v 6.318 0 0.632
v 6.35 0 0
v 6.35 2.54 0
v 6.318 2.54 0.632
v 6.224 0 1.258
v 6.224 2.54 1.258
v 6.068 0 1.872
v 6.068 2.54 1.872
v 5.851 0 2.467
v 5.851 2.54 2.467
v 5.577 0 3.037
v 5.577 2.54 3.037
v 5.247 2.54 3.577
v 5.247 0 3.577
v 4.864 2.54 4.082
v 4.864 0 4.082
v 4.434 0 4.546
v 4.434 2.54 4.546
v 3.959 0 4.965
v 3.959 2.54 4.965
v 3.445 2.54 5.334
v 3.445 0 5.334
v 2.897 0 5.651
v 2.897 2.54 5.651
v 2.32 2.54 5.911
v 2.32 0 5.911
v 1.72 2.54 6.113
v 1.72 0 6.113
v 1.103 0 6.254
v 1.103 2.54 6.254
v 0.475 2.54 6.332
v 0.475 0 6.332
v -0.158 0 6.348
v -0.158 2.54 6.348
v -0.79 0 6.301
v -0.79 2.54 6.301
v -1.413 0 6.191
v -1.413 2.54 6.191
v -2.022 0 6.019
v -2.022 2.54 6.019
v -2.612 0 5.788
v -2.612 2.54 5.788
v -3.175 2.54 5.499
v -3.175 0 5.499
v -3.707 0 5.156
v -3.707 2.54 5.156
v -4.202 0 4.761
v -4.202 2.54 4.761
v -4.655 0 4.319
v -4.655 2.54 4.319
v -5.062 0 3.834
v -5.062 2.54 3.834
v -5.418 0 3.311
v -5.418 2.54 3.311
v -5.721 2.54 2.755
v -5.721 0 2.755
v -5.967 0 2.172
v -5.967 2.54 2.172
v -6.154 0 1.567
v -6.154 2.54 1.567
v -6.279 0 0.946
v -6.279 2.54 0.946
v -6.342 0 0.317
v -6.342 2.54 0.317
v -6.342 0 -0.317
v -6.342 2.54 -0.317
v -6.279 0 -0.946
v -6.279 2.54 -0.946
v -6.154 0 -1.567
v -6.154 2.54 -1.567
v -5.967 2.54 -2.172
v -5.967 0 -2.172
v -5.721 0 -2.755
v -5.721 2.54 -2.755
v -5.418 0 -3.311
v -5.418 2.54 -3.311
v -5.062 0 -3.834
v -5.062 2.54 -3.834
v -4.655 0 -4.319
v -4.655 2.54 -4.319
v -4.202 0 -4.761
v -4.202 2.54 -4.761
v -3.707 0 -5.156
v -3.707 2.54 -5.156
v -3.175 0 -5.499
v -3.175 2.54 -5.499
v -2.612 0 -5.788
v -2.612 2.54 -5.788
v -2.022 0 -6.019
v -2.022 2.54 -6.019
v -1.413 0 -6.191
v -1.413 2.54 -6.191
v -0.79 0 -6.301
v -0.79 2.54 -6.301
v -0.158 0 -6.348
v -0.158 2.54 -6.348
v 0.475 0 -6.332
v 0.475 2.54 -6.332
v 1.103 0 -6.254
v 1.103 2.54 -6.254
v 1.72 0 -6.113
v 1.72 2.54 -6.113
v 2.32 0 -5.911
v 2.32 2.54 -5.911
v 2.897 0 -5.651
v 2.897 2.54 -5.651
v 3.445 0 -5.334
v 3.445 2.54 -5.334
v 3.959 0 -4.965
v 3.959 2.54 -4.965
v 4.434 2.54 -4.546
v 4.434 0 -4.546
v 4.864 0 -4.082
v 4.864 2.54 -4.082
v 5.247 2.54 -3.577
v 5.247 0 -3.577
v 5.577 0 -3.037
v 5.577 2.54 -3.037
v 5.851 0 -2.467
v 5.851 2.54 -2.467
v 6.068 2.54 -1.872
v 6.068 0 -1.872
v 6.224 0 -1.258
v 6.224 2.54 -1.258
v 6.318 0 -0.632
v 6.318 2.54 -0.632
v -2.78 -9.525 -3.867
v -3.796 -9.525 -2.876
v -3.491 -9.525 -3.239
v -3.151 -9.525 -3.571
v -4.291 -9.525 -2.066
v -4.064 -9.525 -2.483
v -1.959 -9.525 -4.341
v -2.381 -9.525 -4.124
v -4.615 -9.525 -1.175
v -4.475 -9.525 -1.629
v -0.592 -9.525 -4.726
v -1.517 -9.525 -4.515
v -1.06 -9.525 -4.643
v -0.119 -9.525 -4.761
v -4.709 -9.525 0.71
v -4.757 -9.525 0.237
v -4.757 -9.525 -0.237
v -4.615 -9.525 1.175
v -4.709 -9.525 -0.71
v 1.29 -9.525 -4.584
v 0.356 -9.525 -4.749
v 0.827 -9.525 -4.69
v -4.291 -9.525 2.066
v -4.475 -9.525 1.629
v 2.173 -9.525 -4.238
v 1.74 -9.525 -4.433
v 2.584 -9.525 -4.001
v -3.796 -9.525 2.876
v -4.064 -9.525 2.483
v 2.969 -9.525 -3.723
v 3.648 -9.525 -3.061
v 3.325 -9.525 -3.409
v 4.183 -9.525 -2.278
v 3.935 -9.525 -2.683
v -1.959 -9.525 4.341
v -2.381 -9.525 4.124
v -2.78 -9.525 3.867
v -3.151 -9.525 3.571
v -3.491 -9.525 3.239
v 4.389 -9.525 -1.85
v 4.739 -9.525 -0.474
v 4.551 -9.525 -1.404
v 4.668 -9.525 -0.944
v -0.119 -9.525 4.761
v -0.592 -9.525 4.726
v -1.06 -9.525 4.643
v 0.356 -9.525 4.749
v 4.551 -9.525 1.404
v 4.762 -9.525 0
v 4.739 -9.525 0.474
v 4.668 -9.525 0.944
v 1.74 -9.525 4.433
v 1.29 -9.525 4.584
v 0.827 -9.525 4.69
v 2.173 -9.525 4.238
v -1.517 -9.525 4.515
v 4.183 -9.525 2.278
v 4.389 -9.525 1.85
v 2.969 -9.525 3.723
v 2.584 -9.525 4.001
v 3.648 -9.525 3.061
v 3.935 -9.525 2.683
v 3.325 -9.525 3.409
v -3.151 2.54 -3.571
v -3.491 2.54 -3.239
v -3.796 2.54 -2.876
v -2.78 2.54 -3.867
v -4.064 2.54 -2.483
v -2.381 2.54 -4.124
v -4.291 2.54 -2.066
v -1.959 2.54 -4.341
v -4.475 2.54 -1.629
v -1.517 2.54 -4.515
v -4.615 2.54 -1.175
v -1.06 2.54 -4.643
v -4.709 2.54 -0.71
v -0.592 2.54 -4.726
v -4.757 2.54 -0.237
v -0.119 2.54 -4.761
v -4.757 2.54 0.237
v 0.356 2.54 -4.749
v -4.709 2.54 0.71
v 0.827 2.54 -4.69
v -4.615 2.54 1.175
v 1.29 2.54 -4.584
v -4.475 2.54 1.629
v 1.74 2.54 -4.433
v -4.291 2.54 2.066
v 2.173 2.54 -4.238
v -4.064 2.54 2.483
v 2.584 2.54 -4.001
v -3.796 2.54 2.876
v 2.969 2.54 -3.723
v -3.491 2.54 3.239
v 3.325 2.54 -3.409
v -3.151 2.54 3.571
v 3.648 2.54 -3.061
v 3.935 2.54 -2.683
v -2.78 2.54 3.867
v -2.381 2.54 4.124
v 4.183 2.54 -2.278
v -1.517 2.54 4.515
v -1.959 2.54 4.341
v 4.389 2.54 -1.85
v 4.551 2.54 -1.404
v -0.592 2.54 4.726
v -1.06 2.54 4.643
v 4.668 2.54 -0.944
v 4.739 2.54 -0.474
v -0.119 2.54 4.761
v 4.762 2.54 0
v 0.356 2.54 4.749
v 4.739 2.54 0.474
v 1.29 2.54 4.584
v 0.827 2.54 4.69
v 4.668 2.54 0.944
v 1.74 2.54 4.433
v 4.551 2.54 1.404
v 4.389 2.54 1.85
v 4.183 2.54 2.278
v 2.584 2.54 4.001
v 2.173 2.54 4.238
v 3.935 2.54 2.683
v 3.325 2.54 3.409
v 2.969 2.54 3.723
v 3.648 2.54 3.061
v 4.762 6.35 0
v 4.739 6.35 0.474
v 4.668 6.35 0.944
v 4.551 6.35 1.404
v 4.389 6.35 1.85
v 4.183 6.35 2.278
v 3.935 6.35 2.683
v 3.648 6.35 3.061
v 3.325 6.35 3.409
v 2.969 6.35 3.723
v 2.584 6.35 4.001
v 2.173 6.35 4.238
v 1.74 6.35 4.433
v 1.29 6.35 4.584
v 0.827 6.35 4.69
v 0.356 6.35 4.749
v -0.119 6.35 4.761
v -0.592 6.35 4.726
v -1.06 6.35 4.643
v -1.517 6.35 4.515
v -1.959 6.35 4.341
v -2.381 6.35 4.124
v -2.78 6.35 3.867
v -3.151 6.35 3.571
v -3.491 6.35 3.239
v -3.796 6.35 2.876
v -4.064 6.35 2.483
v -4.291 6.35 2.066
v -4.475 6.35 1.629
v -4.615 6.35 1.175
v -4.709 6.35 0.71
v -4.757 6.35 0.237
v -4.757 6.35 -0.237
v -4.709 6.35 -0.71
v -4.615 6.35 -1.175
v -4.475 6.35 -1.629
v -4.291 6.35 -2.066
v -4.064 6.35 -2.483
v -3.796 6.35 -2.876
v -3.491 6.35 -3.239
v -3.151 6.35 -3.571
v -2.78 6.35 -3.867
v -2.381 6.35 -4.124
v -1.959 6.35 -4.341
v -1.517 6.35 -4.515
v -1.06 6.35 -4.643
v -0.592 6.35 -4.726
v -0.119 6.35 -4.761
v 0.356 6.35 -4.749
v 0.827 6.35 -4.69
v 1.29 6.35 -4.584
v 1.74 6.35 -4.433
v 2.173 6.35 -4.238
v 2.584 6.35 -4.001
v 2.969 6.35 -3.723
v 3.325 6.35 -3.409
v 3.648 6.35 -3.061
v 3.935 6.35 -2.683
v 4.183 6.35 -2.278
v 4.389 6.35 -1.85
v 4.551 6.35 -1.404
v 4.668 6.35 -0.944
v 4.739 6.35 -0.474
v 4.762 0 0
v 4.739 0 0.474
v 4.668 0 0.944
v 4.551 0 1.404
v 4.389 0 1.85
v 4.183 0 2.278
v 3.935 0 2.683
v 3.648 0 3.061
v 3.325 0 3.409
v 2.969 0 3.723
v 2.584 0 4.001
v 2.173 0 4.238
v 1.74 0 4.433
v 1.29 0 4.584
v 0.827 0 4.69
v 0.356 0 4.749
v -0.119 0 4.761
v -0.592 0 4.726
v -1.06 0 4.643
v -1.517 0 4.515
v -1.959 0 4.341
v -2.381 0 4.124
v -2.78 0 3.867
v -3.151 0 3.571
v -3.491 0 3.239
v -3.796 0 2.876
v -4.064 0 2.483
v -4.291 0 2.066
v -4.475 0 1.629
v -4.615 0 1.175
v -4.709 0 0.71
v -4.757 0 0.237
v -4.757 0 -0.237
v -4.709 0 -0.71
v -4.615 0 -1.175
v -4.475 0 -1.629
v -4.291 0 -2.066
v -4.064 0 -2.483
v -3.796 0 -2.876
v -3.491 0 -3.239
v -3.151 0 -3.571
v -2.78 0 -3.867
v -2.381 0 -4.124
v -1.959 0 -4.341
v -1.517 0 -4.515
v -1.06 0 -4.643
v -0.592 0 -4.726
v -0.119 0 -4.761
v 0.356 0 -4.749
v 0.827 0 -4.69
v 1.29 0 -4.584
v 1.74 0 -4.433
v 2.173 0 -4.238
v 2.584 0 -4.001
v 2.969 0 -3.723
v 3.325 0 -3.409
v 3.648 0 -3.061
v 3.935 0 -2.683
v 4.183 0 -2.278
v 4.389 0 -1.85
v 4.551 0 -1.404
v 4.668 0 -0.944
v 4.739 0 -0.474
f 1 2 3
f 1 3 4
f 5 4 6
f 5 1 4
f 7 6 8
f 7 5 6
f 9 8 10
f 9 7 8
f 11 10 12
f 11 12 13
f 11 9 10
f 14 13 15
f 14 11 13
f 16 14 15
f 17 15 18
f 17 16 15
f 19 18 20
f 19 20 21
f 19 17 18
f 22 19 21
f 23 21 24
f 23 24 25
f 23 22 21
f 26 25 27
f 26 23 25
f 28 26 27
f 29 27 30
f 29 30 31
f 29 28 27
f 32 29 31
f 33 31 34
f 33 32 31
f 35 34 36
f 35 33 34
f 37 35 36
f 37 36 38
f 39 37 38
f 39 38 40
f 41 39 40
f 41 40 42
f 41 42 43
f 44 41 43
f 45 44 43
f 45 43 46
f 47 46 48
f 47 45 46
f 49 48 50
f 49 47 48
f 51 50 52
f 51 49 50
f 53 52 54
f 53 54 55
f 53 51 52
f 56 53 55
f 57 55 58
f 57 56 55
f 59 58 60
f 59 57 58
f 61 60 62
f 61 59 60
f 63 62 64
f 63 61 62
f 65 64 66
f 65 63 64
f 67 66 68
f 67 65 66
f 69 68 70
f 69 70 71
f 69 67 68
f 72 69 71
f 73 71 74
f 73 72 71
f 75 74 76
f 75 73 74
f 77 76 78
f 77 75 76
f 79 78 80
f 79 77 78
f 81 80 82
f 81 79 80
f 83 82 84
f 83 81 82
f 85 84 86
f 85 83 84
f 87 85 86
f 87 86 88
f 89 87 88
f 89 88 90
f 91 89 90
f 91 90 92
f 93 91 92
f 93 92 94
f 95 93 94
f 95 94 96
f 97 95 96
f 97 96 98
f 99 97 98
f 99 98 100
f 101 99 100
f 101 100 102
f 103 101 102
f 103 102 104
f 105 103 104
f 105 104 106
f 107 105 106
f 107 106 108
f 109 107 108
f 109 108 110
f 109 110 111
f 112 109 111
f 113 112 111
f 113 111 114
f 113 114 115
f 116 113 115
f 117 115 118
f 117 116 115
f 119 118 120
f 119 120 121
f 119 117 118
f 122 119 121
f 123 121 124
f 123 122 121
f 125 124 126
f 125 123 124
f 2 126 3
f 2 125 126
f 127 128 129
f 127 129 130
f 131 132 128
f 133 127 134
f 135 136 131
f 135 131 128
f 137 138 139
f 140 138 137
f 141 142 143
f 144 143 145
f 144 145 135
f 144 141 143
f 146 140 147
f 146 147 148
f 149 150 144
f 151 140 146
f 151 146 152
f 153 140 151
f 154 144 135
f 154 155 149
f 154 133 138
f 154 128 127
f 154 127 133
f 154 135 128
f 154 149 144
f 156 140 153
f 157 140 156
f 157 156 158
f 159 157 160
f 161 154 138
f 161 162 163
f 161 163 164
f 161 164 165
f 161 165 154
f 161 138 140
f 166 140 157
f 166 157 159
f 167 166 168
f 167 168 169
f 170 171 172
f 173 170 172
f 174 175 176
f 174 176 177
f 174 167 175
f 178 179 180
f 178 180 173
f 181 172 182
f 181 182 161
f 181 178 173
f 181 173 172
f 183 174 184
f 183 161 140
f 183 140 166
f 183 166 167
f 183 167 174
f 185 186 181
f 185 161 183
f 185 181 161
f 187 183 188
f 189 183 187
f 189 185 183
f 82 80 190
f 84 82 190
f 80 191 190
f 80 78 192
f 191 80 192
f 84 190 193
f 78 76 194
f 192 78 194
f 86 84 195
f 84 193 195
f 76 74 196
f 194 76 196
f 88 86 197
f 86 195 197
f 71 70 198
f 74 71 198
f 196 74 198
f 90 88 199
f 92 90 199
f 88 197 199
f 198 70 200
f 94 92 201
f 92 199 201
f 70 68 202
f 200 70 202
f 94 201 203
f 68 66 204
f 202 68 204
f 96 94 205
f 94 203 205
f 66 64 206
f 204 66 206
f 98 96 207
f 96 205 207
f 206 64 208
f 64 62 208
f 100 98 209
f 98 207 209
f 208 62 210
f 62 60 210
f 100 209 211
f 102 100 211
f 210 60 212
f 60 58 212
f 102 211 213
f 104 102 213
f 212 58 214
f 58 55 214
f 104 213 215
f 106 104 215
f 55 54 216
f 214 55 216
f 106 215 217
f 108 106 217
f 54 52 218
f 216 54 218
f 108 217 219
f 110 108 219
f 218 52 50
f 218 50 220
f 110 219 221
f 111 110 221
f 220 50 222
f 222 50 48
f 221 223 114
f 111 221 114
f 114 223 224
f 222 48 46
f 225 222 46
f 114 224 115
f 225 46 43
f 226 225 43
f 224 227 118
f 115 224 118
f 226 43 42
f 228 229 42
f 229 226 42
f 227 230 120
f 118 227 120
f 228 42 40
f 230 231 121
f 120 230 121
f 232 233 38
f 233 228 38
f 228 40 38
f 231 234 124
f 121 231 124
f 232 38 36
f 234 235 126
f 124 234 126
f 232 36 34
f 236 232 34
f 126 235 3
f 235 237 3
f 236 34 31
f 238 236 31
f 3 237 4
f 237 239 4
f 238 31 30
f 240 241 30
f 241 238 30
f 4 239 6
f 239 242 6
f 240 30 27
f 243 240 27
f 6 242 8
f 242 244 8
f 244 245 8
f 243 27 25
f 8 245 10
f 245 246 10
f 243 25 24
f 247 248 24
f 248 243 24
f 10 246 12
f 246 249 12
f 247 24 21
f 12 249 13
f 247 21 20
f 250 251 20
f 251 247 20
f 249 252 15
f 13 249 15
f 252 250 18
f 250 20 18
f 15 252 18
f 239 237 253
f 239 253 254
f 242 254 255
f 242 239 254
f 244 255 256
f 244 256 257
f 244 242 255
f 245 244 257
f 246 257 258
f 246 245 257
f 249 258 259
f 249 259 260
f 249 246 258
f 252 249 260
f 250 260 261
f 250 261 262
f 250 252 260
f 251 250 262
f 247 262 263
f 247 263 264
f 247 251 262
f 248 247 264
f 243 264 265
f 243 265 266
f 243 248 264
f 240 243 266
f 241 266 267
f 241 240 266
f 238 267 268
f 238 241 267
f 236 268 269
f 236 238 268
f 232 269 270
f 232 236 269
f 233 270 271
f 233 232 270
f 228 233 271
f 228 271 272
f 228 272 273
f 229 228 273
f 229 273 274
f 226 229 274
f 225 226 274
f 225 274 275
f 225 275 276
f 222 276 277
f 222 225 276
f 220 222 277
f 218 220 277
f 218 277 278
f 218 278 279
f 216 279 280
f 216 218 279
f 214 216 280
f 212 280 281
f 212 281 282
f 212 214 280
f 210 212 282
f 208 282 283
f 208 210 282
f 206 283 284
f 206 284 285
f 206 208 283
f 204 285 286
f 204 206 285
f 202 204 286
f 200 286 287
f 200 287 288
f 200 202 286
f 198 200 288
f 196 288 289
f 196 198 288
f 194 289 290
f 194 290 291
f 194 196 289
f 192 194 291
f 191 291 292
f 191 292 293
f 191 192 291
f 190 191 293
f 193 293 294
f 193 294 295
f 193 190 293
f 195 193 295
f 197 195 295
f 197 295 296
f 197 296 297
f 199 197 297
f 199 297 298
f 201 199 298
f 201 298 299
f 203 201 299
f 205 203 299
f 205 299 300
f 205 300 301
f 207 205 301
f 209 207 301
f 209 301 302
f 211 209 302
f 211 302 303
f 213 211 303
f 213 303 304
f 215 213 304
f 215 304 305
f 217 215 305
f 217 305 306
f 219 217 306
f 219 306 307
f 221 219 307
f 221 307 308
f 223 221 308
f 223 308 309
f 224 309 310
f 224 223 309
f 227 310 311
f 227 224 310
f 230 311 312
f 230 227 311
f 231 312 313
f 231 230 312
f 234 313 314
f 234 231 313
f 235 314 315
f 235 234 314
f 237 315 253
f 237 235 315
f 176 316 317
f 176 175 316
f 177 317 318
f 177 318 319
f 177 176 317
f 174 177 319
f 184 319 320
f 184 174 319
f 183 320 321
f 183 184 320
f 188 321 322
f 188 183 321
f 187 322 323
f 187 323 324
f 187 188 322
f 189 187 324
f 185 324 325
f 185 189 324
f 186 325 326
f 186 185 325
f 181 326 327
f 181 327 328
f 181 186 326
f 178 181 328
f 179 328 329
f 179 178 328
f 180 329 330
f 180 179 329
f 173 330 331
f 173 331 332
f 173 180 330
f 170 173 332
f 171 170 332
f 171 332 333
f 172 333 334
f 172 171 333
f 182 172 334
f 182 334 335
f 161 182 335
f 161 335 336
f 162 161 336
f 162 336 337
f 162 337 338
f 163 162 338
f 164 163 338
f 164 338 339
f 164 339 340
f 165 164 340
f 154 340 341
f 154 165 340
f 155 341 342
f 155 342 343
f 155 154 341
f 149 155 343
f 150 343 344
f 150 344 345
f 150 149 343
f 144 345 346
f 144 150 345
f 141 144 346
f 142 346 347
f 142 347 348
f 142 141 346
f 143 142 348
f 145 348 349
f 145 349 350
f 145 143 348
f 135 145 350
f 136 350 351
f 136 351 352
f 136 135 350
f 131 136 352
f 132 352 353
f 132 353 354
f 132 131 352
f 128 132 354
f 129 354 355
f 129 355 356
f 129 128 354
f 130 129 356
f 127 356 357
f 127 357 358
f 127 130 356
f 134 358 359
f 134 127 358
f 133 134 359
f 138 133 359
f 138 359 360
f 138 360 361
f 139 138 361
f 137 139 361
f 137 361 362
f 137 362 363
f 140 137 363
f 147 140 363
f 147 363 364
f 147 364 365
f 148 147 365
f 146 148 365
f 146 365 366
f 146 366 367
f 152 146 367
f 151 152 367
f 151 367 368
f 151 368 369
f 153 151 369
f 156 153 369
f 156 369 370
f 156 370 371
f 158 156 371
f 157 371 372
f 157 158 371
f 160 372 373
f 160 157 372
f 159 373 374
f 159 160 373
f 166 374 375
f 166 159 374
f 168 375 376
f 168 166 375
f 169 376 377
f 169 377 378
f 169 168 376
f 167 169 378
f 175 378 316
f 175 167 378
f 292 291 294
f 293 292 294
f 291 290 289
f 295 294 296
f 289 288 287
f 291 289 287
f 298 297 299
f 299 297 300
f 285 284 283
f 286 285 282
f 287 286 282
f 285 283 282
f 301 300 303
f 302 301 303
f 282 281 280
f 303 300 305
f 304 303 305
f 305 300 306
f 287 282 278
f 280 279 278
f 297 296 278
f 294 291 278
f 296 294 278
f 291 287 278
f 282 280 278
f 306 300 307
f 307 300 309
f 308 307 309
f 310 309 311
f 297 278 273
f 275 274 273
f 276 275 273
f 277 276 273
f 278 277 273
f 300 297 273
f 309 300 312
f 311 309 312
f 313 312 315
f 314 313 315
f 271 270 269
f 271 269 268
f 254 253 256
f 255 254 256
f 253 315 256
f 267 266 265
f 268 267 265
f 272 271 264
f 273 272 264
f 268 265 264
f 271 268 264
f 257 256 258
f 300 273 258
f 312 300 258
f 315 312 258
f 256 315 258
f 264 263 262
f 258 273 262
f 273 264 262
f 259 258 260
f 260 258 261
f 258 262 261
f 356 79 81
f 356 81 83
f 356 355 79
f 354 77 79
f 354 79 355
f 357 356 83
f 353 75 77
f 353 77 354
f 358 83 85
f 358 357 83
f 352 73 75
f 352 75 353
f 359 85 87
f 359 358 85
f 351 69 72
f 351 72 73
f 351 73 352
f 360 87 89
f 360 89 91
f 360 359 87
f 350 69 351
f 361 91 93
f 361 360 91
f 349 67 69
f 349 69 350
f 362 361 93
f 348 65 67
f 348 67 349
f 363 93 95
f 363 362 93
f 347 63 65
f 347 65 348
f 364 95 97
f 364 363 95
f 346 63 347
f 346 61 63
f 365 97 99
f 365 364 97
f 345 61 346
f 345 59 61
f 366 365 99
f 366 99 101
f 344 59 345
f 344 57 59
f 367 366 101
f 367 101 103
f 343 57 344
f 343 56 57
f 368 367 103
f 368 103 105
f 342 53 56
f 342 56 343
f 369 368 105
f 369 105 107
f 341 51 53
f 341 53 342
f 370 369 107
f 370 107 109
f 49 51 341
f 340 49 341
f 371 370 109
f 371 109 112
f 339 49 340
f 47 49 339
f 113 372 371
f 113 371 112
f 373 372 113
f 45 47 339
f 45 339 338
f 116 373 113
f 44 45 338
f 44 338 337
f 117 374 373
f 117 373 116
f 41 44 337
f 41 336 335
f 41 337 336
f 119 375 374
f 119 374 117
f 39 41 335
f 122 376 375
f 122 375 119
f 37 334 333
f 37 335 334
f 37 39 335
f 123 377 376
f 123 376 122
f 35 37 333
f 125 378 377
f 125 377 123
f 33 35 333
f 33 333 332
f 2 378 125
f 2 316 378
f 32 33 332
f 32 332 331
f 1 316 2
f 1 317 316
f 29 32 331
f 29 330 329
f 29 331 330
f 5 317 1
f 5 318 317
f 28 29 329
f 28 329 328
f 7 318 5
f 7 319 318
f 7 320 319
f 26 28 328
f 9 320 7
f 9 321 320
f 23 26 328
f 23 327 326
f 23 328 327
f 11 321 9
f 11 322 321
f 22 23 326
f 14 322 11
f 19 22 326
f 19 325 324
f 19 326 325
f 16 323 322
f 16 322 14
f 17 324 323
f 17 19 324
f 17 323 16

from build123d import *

# Parameters (mm, degrees)
F0_R          = 4.7625
F1_DEPTH      = 9.525
F1_DEPTH_BACK = 6.35
F2_R          = 6.35
F3_DEPTH      = 2.54


with BuildPart() as f1:
    # F0 (on Front) → F1 (new body, two sides)
    with BuildSketch(Plane.XZ) as f1_sk:
        Circle(F0_R)
    extrude(amount=F1_DEPTH)
    extrude(f1_sk.sketch, amount=-F1_DEPTH_BACK)

    # F2 (on Front) → F3 (join)
    with BuildSketch(Plane.XZ):
        Circle(F2_R)
    extrude(amount=-F3_DEPTH)


solid = f1.part
